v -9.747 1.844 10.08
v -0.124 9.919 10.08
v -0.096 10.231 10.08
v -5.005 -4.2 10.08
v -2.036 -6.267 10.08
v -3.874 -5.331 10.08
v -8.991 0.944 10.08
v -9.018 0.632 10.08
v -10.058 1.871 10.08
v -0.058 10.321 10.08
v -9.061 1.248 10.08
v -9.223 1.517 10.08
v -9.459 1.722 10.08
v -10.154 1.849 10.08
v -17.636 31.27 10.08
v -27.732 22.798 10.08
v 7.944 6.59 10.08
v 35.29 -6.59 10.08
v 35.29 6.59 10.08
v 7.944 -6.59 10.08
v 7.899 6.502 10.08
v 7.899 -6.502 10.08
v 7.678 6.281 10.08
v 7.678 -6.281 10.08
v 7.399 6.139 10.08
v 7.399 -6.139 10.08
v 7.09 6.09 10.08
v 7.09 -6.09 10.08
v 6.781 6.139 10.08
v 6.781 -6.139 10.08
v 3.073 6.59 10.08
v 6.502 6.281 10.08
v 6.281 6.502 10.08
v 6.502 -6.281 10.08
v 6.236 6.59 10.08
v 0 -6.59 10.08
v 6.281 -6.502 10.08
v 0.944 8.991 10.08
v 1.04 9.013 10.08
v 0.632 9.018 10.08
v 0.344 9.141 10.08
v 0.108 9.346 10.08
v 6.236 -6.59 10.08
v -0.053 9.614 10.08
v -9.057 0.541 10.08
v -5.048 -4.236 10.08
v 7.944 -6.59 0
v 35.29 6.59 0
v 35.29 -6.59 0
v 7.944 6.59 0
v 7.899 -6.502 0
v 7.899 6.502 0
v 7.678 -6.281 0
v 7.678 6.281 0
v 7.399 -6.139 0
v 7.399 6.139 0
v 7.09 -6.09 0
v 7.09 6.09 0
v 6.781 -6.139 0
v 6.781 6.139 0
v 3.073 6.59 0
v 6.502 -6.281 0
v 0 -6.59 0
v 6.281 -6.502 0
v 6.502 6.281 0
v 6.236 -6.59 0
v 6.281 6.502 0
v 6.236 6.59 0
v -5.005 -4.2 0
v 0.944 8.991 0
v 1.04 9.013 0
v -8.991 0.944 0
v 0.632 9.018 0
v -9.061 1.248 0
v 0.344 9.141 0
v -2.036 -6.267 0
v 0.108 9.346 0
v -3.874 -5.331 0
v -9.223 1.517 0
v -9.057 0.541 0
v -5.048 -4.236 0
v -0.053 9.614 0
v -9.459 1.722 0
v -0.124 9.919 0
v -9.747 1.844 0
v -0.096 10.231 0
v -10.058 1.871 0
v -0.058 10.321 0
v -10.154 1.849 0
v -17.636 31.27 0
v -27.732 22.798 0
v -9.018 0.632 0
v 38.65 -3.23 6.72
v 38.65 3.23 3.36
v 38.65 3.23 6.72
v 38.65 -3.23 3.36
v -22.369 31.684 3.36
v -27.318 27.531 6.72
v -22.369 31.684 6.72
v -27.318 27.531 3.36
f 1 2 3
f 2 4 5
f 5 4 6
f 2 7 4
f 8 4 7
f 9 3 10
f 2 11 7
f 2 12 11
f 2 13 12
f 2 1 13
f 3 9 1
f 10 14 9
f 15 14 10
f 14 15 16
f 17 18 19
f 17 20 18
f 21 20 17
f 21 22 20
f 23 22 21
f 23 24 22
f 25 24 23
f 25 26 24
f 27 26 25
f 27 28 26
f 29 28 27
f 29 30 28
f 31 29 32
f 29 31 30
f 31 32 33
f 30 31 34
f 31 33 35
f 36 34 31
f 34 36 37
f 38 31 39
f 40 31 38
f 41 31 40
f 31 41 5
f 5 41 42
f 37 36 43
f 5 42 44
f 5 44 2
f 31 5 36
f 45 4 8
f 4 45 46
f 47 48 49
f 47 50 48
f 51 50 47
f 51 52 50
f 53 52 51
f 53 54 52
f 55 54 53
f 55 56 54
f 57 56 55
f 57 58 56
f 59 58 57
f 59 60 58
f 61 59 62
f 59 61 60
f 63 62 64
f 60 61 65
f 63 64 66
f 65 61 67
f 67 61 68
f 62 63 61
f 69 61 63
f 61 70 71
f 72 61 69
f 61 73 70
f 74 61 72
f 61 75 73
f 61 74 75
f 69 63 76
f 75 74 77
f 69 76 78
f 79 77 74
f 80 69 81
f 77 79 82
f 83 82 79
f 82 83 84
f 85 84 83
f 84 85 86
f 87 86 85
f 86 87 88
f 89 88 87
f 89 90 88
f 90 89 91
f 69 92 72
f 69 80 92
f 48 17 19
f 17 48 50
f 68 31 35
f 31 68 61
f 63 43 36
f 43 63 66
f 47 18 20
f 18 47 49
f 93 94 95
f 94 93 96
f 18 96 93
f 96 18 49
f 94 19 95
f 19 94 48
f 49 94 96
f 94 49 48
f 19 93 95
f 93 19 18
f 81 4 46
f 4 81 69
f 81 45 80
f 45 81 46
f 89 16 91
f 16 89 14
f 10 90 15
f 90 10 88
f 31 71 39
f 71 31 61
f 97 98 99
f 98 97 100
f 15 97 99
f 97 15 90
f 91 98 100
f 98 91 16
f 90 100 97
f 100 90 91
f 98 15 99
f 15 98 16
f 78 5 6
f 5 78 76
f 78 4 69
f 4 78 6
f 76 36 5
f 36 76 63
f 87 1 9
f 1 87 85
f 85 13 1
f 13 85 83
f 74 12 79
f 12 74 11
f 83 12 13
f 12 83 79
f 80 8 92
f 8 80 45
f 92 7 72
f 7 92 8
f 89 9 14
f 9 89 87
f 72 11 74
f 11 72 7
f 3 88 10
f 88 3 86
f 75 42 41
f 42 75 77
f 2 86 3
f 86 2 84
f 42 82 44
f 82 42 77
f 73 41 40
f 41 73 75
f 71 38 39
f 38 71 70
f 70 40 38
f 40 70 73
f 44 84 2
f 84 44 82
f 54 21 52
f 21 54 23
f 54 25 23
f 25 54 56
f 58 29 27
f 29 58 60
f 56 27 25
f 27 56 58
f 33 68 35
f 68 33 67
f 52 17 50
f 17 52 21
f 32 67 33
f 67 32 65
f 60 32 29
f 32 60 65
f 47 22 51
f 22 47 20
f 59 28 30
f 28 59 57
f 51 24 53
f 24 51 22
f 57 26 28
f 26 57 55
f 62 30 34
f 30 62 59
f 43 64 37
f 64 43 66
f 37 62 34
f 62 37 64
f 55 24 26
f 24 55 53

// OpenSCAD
// This thing allows you to create corners, tees, crosses, 
// and splices for fixing up your window screens.
//
// This is licensed under the creative commons+attribution licence
// To fulfil the attribution requirement, please link to:
//		http://www.thingiverse.com/thing:897599

/* [Main] */

// what shape of screen connector
shape=0; // [0:corner,1:splice,2:tee,3:four way]

// the style of the screen connector
style=1; // [0:mitre,1:straight_end]

// how wide
width=13.18;

// measurement from the edge to the corner
depth_to_corner=25.47;

// how thick the part is
thickness=10.08;

// The angle of the joint (only works for corner)
angle=130;

/* [Advanced] */

// This makes it look nicer, but can make printablility more complex
outer_thickness=0;

/* [Hidden] */

module end(bevel,width,depth,thickness){
	translate([0,-width/2,0]) cube([depth-bevel,width,thickness]);
	translate([depth-bevel/2,0,thickness/2]) rotate([0,-90,0]) frustum(thickness,width,thickness-bevel*2,width-bevel*2,bevel);
}

module old_mitre_style(){
	outside_corner_r=width/6;
	inside_corner_r=width/18;
	bevel=thickness/3;
	translate([0,0,-thickness/2]) linear_extrude(thickness) {
		difference(){
			union(){
				translate([0,bevel-depth_to_corner,0]) square([width,depth_to_corner-bevel]);
				rotate([0,0,90]) square([width,depth_to_corner-bevel]);
				translate([width-outside_corner_r,width-outside_corner_r,0]) circle(r=outside_corner_r,$fn=20);
				square([width-outside_corner_r,width]);
				square([width,width-outside_corner_r]);
			}
			circle(r=inside_corner_r,$fn=20);
		}
	}
	translate([bevel/2-depth_to_corner,width/2,0]) rotate([0,90,0]) frustum(thickness,width,thickness-bevel*2,width-bevel*2,bevel);
	translate([width/2,bevel/2-depth_to_corner,0]) rotate([0,0,90]) rotate([0,90,0]) frustum(thickness,width,thickness-bevel*2,width-bevel*2,bevel);
}



module frustum(w,h,w2,h2,d){
	hull(){
		translate([-w/2,-h/2,d/2]) cube([w,h,0.01]);
		translate([-w2/2,-h2/2,-d/2]) cube([w2,h2,0.01]);
	}
}

module reliefs(angle,r=1,$fn=20){
	n=width/2+r/2;
	translate([ n, n,-1]) cylinder(r=r,h=thickness+2);
	translate([-n,-n,-1]) cylinder(r=r,h=thickness+2);
	translate([ n,-n,-1]) cylinder(r=r,h=thickness+2);
	rotate([0,0,angle]) {
		translate([ n, n,-1]) cylinder(r=r,h=thickness+2);
		//translate([-n,-n,-1]) cylinder(r=r,h=thickness+2);
		translate([ n,-n,-1]) cylinder(r=r,h=thickness+2);
	}
}

if (outer_thickness<=0){
	outer_thickness=thickness;
}

difference(){
	union(){
		if(shape==0){ //corner
			end(thickness/3,width,depth_to_corner+width,thickness,mitre=style==0);
			rotate([0,0,angle]) end(thickness/3,width,depth_to_corner+width,thickness);
			if(style==0||((angle%90)!=0)){
				cylinder(r=width/2,h=thickness,$fn=20);
			}else{
				translate([-width/2,-width/2,-outer_thickness]) cube([width,width,thickness+2*outer_thickness]);
			}
		}
		if(shape==1){ // straight (only miter style/no connector)
			end(thickness/3,width,depth_to_corner,thickness);
			rotate([0,0,180]) end(thickness/3,width,depth_to_corner,thickness);
		}
		if(shape==2){ // 3-way (always non-miter style)
			end(thickness/3,width,depth_to_corner+width,thickness);
			rotate([0,0,90]) end(thickness/3,width,depth_to_corner+width,thickness);
			rotate([0,0,180]) end(thickness/3,width,depth_to_corner+width,thickness);
			translate([-width/2,-width/2,-(outer_thickness-thickness)/2]) cube([width,width,outer_thickness]);
		}
		if(shape==3){ // 4-way (always non-miter style)
			end(thickness/3,width,depth_to_corner+width,thickness);
			rotate([0,0,90]) end(thickness/3,width,depth_to_corner+width,thickness);
			rotate([0,0,180]) end(thickness/3,width,depth_to_corner+width,thickness);
			rotate([0,0,-90]) end(thickness/3,width,depth_to_corner+width,thickness);
			translate([-width/2,-width/2,-(outer_thickness-thickness)/2]) cube([width,width,outer_thickness]);
		}
	}
	reliefs(angle);
}
